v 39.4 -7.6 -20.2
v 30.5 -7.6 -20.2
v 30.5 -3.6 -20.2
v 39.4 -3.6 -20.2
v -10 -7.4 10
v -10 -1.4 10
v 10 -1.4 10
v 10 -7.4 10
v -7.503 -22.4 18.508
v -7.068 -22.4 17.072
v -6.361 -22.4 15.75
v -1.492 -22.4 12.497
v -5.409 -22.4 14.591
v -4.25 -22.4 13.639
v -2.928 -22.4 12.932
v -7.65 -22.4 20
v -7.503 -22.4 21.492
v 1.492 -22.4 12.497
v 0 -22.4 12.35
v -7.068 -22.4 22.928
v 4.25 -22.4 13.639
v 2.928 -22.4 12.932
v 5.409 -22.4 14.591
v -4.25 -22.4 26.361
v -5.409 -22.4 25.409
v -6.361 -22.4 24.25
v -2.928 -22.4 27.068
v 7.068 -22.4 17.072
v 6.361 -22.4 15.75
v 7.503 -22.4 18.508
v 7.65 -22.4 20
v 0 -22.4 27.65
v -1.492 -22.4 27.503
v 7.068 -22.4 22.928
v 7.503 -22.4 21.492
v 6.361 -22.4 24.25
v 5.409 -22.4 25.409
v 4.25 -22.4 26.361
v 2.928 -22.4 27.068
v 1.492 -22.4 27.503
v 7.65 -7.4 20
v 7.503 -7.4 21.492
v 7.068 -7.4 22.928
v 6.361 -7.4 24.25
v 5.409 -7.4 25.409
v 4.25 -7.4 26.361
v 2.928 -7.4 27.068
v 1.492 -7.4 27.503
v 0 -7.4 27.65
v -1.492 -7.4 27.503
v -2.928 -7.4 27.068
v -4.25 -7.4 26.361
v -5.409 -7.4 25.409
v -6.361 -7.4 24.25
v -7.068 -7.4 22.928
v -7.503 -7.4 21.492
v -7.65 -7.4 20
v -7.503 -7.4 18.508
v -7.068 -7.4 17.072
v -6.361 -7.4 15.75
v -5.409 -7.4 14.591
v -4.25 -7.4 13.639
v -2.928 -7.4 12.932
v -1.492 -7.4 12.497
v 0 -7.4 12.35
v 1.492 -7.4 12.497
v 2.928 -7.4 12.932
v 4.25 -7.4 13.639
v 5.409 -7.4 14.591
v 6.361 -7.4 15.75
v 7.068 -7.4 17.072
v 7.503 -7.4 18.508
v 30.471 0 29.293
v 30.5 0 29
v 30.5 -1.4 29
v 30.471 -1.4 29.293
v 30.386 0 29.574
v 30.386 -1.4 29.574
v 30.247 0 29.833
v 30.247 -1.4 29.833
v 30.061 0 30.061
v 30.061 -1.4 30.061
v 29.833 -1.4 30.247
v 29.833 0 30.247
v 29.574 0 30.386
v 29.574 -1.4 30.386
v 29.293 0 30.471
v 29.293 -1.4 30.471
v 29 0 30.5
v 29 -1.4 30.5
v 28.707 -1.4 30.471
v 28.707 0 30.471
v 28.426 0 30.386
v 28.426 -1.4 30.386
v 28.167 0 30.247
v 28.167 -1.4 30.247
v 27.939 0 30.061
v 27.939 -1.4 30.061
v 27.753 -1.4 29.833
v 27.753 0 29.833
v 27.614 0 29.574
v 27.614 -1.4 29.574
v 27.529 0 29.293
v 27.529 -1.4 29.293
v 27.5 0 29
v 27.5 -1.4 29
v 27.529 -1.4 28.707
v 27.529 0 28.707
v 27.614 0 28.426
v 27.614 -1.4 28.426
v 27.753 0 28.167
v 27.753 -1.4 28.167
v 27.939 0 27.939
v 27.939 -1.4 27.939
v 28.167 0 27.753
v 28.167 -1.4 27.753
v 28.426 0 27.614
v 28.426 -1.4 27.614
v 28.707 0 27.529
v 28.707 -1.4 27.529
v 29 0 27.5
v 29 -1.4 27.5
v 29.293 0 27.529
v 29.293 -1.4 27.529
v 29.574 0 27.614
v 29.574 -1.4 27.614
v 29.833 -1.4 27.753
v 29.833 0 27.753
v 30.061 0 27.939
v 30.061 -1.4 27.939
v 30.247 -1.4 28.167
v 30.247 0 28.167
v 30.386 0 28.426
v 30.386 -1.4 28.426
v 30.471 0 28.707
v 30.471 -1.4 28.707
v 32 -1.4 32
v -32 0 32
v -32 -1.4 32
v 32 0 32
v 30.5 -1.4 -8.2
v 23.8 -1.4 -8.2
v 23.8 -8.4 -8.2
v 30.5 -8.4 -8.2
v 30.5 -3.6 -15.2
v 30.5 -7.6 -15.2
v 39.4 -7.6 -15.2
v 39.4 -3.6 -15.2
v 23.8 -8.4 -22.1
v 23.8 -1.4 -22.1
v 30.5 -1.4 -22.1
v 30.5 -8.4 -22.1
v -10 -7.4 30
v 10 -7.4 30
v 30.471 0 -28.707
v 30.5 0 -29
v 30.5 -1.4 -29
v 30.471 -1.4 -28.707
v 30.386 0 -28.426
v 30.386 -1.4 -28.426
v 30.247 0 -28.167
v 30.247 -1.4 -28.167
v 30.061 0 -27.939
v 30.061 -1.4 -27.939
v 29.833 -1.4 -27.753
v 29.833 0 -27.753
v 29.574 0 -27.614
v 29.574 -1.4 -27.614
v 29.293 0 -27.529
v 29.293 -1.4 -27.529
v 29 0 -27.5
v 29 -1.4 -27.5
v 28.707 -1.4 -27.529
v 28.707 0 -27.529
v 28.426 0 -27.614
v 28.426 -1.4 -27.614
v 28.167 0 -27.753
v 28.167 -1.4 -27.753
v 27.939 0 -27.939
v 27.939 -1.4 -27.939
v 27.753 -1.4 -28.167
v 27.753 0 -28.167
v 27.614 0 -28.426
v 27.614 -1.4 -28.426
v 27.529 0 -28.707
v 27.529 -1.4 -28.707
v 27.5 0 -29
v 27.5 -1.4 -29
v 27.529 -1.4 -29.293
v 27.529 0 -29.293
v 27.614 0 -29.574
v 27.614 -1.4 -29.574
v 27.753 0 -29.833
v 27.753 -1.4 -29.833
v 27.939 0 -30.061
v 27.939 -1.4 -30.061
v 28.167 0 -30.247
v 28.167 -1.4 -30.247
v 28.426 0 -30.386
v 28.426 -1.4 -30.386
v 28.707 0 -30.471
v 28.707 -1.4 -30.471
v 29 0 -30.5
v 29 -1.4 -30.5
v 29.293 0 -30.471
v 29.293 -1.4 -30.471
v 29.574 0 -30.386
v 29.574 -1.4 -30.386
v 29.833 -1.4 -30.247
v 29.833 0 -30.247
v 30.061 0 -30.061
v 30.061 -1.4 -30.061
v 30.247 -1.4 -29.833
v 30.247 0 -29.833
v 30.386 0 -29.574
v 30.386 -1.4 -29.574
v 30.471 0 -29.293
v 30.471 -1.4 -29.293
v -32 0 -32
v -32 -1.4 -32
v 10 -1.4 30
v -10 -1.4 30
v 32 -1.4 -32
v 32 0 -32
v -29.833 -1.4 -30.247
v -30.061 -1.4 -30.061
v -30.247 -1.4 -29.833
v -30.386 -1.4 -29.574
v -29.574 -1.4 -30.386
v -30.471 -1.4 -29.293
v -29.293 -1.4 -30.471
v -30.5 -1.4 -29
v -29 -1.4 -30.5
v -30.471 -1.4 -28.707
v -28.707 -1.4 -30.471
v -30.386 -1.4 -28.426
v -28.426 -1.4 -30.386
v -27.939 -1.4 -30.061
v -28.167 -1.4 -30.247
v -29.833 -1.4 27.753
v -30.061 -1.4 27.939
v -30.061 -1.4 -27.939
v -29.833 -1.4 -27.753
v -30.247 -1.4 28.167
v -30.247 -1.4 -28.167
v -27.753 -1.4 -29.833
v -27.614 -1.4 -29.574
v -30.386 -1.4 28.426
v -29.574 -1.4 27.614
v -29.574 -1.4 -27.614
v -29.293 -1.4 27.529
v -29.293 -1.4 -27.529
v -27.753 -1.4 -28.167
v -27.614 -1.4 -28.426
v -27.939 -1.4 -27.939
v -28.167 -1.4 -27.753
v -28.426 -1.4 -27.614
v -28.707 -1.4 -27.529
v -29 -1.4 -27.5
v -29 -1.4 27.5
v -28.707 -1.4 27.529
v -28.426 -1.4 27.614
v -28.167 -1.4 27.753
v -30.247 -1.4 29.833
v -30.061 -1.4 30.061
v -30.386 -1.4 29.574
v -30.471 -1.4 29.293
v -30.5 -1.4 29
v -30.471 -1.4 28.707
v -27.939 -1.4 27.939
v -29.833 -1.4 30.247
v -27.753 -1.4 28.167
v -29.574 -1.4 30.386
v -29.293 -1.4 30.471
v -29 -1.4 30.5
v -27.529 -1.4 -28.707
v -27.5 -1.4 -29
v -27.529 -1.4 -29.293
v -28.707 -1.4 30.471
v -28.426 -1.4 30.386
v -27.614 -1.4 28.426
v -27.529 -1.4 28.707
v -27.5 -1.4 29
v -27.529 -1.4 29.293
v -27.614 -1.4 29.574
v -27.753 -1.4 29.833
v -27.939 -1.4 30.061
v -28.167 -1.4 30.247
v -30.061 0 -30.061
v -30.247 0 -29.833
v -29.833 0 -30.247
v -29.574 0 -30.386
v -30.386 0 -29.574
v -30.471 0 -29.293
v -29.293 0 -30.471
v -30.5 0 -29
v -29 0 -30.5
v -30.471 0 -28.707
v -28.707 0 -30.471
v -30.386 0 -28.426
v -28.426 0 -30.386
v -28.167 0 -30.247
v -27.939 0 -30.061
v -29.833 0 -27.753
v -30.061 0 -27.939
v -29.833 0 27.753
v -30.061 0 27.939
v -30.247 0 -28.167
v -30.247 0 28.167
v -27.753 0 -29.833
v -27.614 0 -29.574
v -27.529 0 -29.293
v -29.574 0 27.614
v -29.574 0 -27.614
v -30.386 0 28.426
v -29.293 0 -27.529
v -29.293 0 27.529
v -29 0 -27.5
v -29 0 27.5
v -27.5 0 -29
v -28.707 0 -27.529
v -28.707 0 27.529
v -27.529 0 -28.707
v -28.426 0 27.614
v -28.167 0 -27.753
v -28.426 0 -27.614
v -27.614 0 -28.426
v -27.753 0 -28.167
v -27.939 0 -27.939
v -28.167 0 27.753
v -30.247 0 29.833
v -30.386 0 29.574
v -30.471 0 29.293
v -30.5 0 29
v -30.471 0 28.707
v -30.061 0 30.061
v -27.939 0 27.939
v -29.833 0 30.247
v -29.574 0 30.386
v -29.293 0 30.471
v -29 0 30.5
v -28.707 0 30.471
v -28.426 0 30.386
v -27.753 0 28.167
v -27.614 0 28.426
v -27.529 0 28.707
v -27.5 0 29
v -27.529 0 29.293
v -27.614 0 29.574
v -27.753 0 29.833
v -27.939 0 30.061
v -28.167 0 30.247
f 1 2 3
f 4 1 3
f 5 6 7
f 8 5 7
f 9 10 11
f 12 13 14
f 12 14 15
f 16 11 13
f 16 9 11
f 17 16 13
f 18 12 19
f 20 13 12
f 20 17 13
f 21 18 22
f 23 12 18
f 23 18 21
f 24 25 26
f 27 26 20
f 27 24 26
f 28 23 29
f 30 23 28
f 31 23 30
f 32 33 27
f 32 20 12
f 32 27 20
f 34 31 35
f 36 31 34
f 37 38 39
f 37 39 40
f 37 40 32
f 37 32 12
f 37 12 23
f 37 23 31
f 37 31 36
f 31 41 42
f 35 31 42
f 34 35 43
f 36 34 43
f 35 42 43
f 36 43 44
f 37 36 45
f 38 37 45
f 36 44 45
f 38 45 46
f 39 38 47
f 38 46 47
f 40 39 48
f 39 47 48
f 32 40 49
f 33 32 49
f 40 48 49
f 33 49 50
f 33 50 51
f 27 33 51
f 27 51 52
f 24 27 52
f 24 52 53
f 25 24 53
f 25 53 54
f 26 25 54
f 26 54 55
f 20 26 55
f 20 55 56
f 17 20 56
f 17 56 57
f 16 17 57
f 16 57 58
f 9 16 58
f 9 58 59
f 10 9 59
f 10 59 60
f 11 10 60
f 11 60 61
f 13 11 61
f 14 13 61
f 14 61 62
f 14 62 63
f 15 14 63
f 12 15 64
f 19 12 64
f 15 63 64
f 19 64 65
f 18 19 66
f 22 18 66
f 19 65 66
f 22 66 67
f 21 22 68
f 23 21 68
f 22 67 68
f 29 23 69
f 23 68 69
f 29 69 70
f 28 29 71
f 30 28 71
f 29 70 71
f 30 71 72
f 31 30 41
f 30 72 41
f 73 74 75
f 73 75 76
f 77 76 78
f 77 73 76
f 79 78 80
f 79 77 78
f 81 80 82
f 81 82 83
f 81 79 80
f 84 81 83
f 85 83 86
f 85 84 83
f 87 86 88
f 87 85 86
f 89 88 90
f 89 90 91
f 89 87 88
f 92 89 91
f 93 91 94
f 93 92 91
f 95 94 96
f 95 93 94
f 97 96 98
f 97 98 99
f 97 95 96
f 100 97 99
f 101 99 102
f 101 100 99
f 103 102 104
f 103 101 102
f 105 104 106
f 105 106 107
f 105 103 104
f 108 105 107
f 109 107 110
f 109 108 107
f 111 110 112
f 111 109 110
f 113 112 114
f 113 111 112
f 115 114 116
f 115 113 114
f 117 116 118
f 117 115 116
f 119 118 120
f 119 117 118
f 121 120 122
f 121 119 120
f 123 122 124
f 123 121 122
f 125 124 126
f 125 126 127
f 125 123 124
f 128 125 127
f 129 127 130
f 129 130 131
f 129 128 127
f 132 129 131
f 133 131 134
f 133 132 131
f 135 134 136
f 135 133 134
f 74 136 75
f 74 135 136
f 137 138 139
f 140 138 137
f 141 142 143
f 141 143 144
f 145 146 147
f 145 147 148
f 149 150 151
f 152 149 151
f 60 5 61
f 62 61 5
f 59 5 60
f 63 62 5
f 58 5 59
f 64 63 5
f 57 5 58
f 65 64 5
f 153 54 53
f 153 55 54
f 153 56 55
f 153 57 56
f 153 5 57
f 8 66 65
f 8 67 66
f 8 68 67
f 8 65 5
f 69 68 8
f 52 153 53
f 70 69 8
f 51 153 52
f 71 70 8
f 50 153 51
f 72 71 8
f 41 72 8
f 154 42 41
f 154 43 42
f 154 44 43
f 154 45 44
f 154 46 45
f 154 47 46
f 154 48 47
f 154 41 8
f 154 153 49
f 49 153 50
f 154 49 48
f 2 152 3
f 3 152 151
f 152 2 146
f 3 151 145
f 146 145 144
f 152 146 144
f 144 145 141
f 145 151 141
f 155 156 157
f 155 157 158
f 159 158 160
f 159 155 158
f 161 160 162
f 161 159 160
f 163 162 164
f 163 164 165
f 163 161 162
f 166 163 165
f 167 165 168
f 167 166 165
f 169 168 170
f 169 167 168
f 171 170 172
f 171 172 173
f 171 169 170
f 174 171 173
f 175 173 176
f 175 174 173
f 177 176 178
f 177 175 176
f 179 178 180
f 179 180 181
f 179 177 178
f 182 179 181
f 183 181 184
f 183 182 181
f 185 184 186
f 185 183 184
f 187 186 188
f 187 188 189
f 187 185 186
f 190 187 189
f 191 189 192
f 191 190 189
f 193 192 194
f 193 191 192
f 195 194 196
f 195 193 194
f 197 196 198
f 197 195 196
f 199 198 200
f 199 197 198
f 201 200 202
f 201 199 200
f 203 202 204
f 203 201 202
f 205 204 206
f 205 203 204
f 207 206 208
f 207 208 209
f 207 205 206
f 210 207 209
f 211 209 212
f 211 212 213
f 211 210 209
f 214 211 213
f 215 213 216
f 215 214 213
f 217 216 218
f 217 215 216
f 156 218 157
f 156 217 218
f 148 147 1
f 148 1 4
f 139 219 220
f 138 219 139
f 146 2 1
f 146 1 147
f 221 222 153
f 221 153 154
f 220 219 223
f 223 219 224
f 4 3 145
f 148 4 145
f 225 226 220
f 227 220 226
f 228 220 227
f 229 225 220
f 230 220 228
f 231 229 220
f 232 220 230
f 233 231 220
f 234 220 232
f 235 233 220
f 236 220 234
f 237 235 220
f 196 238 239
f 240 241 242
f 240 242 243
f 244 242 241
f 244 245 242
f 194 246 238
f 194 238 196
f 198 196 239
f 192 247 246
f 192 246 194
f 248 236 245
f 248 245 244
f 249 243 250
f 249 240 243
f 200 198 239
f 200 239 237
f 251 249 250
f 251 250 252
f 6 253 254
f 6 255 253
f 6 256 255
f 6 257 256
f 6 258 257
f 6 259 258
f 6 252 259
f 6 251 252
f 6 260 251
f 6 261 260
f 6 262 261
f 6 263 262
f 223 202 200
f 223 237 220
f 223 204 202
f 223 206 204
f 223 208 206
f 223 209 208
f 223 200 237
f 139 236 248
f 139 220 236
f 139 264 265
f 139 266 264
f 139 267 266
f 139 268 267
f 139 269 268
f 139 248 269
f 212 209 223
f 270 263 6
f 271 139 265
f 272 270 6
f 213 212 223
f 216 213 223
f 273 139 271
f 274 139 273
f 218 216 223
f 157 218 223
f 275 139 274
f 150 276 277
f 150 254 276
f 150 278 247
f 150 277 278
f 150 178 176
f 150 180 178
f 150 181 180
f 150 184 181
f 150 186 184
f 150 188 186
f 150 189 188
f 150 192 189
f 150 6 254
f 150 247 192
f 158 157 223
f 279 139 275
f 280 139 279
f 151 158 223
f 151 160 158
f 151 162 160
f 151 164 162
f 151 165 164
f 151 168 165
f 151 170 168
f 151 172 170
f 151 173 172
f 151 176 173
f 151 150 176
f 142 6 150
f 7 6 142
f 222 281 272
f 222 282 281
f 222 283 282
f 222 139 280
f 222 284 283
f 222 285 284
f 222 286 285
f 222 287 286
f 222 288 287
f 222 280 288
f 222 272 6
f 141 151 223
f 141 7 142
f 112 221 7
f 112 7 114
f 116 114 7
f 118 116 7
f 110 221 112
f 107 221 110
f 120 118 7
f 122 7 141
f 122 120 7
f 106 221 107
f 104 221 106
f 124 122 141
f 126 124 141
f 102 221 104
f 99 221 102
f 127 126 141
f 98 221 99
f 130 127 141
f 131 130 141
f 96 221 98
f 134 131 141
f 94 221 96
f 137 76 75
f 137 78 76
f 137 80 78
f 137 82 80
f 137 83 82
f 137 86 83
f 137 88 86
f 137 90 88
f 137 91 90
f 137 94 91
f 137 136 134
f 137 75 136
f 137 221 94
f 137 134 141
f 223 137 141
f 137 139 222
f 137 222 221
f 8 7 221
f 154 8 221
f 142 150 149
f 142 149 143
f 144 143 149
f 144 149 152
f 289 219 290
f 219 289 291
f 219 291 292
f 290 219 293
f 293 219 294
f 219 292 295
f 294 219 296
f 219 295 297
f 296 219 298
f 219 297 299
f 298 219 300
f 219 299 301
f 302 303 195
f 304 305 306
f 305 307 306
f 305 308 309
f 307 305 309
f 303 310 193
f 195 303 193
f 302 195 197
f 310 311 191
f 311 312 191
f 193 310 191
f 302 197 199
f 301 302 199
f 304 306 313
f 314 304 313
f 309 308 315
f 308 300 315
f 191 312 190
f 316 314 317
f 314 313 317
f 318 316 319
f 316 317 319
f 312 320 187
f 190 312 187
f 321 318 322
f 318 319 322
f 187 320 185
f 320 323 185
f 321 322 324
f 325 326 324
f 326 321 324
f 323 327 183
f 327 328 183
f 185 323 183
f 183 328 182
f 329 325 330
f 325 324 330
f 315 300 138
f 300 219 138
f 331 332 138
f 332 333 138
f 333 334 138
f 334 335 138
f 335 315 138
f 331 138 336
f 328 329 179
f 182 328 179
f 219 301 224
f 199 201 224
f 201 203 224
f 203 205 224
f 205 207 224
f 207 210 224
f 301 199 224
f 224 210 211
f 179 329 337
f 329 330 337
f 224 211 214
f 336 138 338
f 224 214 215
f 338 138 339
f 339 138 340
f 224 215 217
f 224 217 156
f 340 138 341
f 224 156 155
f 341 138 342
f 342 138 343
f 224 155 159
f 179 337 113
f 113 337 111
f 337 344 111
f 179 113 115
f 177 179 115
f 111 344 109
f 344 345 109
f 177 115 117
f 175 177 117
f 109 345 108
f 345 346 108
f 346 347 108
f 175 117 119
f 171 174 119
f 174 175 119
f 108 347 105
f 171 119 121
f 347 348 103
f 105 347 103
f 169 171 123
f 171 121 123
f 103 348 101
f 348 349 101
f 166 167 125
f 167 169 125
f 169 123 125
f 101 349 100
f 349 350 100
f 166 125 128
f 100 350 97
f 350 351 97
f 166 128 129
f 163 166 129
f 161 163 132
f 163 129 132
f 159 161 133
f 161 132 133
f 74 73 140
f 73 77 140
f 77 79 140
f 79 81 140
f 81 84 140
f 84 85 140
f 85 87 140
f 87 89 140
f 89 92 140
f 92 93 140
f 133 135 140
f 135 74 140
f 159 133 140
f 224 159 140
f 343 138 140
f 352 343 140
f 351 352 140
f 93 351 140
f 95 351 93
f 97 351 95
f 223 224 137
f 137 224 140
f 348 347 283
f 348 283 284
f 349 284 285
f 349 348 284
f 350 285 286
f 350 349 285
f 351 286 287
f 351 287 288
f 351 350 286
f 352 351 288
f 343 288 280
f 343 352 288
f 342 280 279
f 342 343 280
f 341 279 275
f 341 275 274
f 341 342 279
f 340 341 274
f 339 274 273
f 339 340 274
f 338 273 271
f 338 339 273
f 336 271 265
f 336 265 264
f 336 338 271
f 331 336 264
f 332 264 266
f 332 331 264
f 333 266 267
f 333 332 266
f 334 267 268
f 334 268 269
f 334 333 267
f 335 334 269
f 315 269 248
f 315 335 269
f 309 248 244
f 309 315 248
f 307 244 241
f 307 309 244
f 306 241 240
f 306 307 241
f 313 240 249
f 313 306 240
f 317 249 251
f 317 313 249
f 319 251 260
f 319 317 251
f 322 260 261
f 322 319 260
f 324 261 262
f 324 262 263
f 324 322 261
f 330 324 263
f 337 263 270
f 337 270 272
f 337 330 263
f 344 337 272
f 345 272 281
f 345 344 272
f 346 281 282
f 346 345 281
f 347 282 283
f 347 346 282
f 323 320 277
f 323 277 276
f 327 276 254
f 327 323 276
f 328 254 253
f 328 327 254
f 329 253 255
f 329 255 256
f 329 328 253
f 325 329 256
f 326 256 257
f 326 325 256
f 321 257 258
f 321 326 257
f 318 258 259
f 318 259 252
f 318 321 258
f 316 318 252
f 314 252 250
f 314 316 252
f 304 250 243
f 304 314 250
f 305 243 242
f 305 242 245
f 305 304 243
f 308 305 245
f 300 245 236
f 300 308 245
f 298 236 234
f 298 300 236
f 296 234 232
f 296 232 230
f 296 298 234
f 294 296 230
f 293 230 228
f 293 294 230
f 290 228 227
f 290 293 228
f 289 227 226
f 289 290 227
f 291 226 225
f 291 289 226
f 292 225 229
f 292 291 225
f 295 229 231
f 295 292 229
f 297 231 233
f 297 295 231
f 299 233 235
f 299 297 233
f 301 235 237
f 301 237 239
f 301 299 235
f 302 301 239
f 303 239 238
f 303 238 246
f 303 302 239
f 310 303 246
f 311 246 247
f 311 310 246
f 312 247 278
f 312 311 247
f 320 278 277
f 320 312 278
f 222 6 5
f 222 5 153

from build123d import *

# Parameters (mm, degrees)
F0_W     = 64
F0_H     = 64
F0_R     = 1.5
F1_DEPTH = 1.4
F2_W     = 20
F2_H     = 20
F2_R     = 7.65
F3_DEPTH = 6
F4_DEPTH = 21
F2_W_2   = 6.7
F2_H_2   = 13.9
F5_DEPTH = 7
F6_W     = 4
F6_H     = 5
F7_DEPTH = 8.9


with BuildPart() as f1:
    # F0 (on Front) → F1 (new body)
    with BuildSketch(Plane.XZ):
        Rectangle(F0_W, F0_H)
        with Locations((-29, -29)):
            Circle(F0_R, mode=Mode.SUBTRACT)
        with Locations((29, -29)):
            Circle(F0_R, mode=Mode.SUBTRACT)
        with Locations((-29, 29)):
            Circle(F0_R, mode=Mode.SUBTRACT)
        with Locations((29, 29)):
            Circle(F0_R, mode=Mode.SUBTRACT)
    extrude(amount=F1_DEPTH)

    # F2 (on face) → F3 (join)
    with BuildSketch(Plane.XZ.offset(1.4)):
        with Locations((0, 20)):
            Rectangle(F2_W, F2_H)
        with Locations((0, 20)):
            Circle(F2_R, mode=Mode.SUBTRACT)
    extrude(amount=F3_DEPTH)

    # F4 (add): a face of the model
    f4_faces = [f1.faces().sort_by_distance(p)[0] for p in [
        (0, -1.4, 20),
    ]]
    extrude(f4_faces, amount=F4_DEPTH)

    # F2 (on face) → F5 (join)
    with BuildSketch(Plane.XZ.offset(1.4)):
        with Locations((27.15, -15.15)):
            Rectangle(F2_W_2, F2_H_2)
    extrude(amount=F5_DEPTH)

    # F6 (on face) → F7 (join)
    with BuildSketch(Plane.YZ.offset(30.5)):
        with Locations((-5.6, -17.7)):
            Rectangle(F6_W, F6_H)
    extrude(amount=F7_DEPTH)


solid = f1.part
